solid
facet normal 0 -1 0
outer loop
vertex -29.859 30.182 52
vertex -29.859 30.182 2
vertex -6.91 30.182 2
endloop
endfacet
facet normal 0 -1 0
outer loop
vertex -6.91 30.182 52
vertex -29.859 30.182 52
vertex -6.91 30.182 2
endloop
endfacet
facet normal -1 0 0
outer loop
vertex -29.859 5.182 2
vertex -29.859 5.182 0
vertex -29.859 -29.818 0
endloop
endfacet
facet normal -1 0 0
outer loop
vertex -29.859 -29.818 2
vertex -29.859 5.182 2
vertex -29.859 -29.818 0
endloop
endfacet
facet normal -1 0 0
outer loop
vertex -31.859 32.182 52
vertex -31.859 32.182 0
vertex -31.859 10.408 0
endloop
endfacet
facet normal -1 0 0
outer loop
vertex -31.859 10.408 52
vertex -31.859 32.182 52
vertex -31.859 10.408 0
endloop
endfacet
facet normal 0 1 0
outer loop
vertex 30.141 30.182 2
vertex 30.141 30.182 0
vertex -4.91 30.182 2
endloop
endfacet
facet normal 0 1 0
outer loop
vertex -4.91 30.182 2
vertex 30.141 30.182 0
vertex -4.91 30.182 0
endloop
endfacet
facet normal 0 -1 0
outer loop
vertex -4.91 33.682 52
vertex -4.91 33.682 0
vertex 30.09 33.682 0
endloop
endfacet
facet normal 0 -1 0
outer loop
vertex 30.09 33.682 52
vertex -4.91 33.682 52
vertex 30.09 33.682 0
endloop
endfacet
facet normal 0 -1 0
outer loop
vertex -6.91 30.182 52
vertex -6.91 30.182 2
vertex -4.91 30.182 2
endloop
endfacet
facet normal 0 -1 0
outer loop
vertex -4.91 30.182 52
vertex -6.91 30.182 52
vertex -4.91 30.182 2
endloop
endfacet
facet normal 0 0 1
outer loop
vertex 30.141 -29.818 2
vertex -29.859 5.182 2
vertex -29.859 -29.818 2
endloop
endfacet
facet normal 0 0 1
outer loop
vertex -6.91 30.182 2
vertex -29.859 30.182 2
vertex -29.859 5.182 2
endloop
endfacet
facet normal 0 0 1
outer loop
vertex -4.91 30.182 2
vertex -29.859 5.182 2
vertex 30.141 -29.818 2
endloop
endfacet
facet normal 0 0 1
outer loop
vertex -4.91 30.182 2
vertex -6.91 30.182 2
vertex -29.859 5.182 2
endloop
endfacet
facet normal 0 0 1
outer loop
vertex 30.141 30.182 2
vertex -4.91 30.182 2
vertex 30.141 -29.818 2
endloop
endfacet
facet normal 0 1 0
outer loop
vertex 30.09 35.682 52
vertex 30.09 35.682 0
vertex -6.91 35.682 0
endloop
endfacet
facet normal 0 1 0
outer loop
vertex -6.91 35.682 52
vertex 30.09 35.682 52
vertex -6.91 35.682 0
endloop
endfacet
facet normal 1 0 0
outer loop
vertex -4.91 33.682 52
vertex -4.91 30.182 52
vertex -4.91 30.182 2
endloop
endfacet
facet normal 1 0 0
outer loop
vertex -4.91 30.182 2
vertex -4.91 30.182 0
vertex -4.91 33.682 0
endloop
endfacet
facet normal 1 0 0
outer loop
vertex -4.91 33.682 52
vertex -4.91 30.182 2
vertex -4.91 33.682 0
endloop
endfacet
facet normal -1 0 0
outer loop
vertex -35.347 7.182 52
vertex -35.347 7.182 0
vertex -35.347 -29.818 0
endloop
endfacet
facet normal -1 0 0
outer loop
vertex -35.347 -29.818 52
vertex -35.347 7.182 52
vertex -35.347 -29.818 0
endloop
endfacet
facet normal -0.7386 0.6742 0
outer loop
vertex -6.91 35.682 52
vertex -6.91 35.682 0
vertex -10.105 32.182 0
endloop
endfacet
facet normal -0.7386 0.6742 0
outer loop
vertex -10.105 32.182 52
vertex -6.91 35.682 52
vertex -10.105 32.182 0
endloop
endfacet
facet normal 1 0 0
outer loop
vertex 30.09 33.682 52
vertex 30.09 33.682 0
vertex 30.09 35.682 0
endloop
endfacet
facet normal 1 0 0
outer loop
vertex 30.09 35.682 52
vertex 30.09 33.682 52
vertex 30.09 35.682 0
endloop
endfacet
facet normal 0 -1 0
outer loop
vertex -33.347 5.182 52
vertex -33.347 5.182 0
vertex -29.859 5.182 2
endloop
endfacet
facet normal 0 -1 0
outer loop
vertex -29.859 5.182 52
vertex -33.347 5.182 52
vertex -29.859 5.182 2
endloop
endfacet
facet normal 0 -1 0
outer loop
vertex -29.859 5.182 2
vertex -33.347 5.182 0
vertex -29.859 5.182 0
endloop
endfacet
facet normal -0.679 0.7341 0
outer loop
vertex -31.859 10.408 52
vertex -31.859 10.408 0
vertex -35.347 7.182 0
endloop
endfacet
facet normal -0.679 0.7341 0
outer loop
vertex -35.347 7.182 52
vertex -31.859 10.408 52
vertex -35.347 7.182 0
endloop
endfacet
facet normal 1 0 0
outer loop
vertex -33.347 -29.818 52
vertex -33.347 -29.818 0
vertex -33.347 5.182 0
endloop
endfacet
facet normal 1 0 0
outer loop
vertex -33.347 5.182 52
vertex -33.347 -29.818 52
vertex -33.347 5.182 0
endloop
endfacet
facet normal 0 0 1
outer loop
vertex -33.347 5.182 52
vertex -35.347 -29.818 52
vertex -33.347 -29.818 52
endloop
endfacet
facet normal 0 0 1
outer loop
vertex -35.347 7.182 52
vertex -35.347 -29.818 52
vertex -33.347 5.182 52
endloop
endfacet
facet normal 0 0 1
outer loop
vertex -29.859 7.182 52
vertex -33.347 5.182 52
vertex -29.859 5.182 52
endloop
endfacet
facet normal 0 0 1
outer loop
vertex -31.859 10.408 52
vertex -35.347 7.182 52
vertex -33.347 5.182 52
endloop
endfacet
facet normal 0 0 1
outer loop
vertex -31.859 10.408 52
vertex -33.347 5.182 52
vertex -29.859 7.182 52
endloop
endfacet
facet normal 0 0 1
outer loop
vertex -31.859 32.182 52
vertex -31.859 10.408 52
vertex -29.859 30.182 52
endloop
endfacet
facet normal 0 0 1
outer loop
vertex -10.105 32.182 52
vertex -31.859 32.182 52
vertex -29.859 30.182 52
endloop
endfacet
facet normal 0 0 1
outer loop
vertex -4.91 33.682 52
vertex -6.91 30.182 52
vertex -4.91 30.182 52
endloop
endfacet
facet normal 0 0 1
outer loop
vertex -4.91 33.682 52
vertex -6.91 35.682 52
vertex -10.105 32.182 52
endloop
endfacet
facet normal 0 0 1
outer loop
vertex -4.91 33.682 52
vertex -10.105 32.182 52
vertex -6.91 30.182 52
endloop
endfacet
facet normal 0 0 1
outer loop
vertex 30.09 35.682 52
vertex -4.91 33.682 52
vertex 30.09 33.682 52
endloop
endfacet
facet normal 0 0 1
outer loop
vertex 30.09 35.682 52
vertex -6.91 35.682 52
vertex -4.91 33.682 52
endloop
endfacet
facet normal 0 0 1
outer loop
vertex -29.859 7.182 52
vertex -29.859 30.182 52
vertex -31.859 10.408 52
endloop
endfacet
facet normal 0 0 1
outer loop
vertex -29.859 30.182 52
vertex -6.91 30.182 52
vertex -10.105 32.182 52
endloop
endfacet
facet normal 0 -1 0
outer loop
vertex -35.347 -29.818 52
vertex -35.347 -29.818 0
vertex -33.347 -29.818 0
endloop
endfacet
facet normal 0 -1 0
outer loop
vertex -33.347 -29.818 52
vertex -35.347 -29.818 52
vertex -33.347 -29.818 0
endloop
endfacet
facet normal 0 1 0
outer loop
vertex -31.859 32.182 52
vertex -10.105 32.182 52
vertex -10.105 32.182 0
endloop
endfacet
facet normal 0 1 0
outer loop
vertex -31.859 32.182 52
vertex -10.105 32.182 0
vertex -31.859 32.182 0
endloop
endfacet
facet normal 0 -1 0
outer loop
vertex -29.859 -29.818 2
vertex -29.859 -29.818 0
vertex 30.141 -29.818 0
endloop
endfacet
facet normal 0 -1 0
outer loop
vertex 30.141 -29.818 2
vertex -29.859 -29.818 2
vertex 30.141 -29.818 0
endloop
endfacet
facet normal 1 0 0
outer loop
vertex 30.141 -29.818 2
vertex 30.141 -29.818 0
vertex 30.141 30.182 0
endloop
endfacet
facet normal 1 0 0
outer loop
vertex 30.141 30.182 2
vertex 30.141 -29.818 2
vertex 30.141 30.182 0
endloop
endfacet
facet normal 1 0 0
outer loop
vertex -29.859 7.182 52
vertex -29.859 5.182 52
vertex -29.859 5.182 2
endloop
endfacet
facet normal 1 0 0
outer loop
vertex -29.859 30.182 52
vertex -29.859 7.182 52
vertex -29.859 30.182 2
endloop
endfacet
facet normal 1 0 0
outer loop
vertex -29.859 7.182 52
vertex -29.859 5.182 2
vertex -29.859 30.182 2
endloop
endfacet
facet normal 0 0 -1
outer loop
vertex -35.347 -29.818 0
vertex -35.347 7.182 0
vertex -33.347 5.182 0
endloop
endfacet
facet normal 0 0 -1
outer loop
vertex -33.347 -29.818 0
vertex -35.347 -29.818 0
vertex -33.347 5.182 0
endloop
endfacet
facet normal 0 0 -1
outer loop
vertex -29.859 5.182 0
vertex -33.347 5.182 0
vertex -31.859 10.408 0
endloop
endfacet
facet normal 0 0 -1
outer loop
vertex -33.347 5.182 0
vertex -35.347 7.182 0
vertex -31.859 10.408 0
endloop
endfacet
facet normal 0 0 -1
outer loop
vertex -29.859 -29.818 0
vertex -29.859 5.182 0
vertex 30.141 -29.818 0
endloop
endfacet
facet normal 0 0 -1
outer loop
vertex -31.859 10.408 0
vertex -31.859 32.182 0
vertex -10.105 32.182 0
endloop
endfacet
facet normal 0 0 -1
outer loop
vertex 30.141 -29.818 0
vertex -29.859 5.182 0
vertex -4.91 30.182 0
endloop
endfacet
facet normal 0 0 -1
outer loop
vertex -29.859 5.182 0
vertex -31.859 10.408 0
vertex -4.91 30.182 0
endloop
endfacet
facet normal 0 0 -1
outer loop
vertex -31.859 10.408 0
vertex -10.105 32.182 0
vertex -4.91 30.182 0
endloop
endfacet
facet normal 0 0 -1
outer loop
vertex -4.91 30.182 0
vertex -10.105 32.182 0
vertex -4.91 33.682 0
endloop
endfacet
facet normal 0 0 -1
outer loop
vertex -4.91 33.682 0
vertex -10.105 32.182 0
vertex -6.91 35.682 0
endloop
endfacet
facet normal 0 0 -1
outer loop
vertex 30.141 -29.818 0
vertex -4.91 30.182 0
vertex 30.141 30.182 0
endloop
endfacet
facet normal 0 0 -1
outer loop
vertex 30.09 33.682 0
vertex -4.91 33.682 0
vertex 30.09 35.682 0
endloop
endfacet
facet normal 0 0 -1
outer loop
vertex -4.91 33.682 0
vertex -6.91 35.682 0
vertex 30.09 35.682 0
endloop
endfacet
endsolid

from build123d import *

# Parameters (mm, degrees)
F0_W     = 30
F0_H     = 30
F1_DEPTH = 2
F0_W_2   = 2
F0_H_2   = 1.9999989867
F0_W_3   = 1.9999989867
F0_H_3   = 2
F2_DEPTH = 52


with BuildPart() as f1:
    # F0 (on Top) → F1 (new body)
    with BuildSketch(Plane.XY):
        Polygon((-11.9309425354, 30.1818712056), (-29.8587139696, 30.1818712056), (-29.8587139696, 12.2573869303), (-29.8587139696, 7.1818712056), (-29.8587139696, 5.1818712056), (-29.8587139696, 0.1818712056), (0.1412860304, 0.1818712056), (0.1412860304, 30.1818712056), (-4.8587139696, 30.1818712056), (-4.9099967368, 30.1818712056), (-6.9099967368, 30.1818712056), align=None)
        Polygon((0.1412860304, 0.1818712056), (-29.8587139696, 0.1818712056), (-29.8587139696, -29.8181287944), (-29.847416997, -29.8181287944), (0.1412860304, -29.8181287944), align=None)
        Polygon((30.0900032632, 30.1818712056), (0.1412860304, 30.1818712056), (0.1412860304, 0.1818712056), (30.1412860304, 0.1818712056), (30.1412860304, 30.1818712056), align=None)
        with Locations((15.1412860304, -14.8181287944)):
            Rectangle(F0_W, F0_H)
    extrude(amount=F1_DEPTH)

    # F0 (on Top) → F2 (join)
    with BuildSketch(Plane.XY):
        Polygon((-31.8587129563, 5.1818712056), (-31.8587129563, 7.1818712056), (-35.347416997, 7.1818712056), (-35.347416997, -29.8181287944), (-33.347416997, -29.8181287944), (-33.347416997, 5.1818712056), align=None)
        with Locations((-5.9099967368, 31.1818706989)):
            Rectangle(F0_W_2, F0_H_2)
        Polygon((-6.9099967368, 35.6818712056), (-10.1051449882, 32.1818701923), (-6.9099967368, 32.1818701923), align=None)
        Polygon((-31.8587129563, 7.1818712056), (-31.8587129563, 10.4079470433), (-35.347416997, 7.1818712056), align=None)
        Polygon((-10.1051449882, 32.1818701923), (-11.9309425354, 30.1818712056), (-6.9099967368, 30.1818712056), (-6.9099967368, 32.1818701923), align=None)
        Polygon((-6.9099967368, 35.6818712056), (-6.9099967368, 32.1818701923), (-4.9099967368, 32.1818701923), (-4.9099967368, 33.6818712056), (30.0900032632, 33.6818712056), (30.0900032632, 35.6818712056), align=None)
        Polygon((-29.8587139696, 12.2573869303), (-29.8587139696, 30.1818712056), (-11.9309425354, 30.1818712056), (-10.1051449882, 32.1818701923), (-31.8587129563, 32.1818701923), (-31.8587129563, 10.4079470433), align=None)
        Polygon((-29.8587139696, 7.1818712056), (-29.8587139696, 12.2573869303), (-31.8587129563, 10.4079470433), (-31.8587129563, 7.1818712056), align=None)
        with Locations((-30.8587134629, 6.1818712056)):
            Rectangle(F0_W_3, F0_H_3)
    extrude(amount=F2_DEPTH)


solid = f1.part
